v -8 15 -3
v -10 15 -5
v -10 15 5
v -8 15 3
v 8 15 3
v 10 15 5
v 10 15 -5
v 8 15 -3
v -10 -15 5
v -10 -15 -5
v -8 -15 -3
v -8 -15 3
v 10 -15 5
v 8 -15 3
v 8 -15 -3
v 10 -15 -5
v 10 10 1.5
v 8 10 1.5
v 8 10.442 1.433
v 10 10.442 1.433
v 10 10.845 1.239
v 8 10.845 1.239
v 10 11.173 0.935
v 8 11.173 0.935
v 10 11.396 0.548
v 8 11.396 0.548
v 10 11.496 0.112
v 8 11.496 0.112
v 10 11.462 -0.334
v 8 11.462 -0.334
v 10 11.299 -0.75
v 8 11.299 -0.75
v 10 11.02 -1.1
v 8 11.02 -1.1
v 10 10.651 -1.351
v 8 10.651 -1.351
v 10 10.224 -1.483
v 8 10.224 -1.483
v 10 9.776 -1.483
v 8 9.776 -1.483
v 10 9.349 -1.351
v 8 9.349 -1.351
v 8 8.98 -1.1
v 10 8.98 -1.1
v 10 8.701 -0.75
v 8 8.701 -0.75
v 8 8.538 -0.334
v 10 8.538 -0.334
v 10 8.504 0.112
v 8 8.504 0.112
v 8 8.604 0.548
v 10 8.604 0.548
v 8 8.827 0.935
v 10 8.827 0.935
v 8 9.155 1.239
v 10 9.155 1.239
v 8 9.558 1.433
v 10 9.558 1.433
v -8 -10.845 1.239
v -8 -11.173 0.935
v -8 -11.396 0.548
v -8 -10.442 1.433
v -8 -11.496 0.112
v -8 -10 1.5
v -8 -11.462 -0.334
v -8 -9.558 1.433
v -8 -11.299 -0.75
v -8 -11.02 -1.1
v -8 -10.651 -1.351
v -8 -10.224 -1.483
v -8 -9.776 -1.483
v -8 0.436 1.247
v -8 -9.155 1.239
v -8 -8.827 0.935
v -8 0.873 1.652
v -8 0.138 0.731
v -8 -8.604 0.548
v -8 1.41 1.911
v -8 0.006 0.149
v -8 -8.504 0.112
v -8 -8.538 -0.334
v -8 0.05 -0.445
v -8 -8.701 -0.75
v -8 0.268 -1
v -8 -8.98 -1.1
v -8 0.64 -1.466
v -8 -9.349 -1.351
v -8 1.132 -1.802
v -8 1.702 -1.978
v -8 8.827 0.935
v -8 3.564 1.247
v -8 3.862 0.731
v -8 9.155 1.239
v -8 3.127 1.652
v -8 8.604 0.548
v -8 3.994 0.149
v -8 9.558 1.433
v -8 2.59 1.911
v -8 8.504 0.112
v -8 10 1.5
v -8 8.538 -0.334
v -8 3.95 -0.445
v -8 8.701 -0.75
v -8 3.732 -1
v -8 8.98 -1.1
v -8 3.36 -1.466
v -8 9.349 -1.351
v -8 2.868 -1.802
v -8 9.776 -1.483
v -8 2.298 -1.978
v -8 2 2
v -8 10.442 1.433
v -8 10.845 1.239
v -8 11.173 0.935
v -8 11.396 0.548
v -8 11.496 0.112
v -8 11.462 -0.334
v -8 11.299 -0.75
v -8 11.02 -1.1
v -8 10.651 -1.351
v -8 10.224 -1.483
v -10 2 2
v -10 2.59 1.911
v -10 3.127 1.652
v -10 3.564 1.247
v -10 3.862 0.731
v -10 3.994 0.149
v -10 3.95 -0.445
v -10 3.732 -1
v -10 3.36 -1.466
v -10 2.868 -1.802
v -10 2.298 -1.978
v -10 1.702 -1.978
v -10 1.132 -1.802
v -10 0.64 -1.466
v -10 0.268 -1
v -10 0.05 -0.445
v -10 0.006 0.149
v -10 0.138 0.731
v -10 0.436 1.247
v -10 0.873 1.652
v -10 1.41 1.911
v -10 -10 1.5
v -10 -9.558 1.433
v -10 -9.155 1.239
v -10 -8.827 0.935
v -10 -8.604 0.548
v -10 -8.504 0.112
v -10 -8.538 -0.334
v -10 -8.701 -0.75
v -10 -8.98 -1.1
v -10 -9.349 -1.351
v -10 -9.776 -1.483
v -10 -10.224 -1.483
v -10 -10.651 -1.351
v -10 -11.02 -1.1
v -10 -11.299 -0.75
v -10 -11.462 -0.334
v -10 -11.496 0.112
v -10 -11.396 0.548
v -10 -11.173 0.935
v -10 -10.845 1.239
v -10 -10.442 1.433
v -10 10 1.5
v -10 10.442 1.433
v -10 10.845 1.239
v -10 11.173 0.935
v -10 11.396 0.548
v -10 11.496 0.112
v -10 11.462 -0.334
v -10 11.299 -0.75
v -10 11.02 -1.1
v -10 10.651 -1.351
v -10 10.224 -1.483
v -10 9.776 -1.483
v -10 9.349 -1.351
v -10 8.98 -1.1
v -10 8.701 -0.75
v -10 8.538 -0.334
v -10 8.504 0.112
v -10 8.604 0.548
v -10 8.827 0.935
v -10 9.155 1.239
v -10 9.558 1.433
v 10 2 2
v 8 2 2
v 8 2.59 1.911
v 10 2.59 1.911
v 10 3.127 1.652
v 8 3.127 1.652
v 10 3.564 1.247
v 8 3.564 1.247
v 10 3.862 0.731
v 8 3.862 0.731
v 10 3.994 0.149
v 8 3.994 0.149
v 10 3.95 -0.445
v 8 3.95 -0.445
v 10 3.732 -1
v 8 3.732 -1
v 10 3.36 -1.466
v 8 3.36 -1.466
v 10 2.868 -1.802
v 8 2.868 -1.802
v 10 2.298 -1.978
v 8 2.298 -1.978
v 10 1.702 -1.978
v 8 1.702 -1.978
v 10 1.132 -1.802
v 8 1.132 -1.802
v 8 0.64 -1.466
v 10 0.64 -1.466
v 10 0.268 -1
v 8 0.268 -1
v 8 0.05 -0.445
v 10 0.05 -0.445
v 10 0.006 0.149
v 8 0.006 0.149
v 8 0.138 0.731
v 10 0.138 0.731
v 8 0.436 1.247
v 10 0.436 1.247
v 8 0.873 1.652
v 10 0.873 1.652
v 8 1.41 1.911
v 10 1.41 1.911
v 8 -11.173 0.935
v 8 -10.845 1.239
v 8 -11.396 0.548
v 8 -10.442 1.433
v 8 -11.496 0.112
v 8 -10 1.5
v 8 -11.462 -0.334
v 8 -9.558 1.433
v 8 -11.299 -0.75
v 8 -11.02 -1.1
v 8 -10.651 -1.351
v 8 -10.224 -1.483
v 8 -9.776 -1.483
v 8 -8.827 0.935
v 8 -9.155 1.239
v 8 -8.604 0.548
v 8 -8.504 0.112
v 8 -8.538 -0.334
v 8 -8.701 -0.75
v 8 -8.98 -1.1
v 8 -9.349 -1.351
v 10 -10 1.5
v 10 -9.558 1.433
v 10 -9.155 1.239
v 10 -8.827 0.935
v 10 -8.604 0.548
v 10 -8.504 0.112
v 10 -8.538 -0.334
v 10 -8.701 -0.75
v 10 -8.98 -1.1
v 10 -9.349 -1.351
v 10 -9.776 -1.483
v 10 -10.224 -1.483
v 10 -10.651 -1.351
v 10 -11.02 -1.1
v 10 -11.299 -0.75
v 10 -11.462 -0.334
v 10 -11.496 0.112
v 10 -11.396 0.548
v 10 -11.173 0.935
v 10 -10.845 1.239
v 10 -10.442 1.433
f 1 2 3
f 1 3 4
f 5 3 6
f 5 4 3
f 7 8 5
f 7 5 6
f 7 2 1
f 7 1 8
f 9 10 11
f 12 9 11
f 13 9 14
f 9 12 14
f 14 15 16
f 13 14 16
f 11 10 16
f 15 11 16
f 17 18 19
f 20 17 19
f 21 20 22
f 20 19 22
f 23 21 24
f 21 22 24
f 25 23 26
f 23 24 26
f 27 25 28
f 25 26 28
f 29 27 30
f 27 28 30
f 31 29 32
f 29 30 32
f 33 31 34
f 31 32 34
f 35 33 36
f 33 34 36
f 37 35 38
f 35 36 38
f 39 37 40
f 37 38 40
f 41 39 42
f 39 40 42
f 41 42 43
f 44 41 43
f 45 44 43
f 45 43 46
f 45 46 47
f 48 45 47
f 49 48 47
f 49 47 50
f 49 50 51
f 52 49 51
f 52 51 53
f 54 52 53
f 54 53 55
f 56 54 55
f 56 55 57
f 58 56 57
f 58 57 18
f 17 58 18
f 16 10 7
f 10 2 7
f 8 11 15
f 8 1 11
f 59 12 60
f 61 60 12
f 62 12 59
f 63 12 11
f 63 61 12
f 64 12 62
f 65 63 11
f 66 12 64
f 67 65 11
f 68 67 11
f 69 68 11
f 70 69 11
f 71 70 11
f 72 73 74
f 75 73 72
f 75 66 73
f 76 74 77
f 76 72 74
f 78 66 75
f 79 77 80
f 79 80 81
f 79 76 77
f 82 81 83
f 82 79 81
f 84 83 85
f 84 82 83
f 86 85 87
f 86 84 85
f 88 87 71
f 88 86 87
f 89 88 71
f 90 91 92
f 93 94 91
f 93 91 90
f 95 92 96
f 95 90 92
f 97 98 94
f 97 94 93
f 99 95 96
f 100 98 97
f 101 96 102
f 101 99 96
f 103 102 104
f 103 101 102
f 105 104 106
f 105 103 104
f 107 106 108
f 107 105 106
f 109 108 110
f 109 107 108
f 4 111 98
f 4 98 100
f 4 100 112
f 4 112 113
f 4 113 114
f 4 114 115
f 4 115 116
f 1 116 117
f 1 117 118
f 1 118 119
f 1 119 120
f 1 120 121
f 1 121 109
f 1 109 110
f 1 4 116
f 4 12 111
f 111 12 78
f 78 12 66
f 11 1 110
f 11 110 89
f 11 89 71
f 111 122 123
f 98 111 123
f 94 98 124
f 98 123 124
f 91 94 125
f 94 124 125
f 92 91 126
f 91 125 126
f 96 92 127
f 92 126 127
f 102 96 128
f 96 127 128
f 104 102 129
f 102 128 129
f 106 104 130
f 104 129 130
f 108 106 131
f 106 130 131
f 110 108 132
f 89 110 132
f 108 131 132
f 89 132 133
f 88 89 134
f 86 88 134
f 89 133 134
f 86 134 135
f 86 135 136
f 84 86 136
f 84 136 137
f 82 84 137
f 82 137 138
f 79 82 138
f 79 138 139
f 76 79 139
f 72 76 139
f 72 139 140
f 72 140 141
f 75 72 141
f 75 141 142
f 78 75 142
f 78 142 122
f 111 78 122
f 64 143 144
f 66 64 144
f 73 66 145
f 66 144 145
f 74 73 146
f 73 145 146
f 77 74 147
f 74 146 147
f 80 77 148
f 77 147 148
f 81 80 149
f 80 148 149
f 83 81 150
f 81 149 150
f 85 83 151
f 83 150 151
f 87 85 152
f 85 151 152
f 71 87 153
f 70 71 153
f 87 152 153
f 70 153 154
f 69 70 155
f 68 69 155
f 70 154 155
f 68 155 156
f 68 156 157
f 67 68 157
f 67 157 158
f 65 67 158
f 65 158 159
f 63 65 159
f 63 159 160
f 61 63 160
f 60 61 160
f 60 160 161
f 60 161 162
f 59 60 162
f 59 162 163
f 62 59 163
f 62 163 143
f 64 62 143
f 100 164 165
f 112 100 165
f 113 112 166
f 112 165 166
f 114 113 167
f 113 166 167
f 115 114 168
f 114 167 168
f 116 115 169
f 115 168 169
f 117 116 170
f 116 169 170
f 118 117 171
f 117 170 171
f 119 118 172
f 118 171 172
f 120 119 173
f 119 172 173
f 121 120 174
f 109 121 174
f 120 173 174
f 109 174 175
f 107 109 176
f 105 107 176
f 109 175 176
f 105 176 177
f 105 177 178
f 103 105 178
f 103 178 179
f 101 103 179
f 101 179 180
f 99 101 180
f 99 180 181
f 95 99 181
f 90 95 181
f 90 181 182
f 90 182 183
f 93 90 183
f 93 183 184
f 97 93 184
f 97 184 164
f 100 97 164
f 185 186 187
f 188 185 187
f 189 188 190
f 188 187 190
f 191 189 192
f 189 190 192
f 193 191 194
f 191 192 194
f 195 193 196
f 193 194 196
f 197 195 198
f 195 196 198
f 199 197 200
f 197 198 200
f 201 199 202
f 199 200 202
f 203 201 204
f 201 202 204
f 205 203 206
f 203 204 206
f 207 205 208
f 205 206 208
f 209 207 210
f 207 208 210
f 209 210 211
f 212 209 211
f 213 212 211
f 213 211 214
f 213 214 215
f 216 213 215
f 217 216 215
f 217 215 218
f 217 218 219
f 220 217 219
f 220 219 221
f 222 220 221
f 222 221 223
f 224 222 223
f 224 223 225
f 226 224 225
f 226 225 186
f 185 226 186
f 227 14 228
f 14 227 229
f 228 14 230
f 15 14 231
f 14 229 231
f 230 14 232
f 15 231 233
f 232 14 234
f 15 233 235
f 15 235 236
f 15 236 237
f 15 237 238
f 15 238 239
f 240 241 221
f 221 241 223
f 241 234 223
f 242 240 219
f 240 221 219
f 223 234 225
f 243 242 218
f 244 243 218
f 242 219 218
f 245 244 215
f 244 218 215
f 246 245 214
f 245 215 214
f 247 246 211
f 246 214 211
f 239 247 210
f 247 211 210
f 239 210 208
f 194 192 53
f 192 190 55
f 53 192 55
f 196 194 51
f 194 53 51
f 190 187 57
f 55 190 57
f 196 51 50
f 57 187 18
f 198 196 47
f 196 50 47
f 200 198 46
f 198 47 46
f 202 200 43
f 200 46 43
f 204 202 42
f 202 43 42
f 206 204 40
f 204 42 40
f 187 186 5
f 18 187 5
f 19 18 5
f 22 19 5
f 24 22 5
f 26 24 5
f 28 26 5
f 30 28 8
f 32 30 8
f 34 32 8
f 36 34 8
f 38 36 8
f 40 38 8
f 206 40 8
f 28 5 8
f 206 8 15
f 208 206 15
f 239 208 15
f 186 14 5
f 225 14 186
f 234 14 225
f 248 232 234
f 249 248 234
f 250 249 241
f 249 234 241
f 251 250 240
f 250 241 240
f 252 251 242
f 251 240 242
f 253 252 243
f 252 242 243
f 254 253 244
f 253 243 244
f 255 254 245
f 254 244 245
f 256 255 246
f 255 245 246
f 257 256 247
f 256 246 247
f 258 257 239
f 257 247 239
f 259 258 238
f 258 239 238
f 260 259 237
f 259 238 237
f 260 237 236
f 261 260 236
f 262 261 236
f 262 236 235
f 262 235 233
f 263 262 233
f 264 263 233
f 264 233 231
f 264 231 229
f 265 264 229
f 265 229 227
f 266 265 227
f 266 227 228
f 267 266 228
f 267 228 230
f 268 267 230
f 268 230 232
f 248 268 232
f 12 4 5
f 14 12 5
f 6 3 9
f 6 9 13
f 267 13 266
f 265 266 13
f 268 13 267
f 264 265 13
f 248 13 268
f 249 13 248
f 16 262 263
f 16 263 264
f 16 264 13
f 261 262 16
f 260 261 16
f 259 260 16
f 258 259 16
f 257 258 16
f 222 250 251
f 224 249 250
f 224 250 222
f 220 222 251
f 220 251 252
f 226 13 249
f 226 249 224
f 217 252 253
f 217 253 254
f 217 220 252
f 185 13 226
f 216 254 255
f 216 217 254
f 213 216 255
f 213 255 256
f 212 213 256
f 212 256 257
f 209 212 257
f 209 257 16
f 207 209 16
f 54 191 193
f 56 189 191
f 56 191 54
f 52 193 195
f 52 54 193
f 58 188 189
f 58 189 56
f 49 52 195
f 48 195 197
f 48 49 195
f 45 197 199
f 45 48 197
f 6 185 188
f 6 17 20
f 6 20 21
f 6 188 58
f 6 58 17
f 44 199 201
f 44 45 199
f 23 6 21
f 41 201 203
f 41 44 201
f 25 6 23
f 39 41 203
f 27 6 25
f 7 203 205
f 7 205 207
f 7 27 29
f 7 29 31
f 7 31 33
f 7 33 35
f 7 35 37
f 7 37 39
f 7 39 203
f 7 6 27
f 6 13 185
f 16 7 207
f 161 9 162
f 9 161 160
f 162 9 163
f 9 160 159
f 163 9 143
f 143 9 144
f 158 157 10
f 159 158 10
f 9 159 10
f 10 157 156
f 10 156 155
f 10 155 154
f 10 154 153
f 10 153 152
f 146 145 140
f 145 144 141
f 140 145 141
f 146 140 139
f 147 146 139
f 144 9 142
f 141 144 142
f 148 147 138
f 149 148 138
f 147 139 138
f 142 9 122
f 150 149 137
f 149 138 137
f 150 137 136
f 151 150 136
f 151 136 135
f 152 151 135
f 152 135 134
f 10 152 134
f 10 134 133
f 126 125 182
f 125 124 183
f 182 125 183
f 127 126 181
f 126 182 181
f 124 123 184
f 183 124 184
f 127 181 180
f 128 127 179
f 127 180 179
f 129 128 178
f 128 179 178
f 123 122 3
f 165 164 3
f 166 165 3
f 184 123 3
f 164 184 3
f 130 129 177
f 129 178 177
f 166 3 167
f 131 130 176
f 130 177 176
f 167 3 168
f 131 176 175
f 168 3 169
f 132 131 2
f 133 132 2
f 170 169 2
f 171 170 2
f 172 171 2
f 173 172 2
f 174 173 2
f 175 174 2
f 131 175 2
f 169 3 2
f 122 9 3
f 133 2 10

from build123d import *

# Parameters (mm, degrees)
SKETCH_1_W          = 20
SKETCH_1_H          = 10
SKETCH_1_W_2        = 16
SKETCH_1_H_2        = 6
EXTRUDE_1_DEPTH     = 15
SKETCH_2_R          = 2
SKETCH_2_R_2        = 1.5
CUT_EXTRUDE_1_DEPTH = 26.495097568


with BuildPart() as part:
    # 草图1 → 凸台-拉伸1 (new, symmetric)
    with BuildSketch(Plane(origin=(0, 0, 0), x_dir=(1, 0, 0), z_dir=(0, 1, 0))):
        Rectangle(SKETCH_1_W, SKETCH_1_H)
        Rectangle(SKETCH_1_W_2, SKETCH_1_H_2, mode=Mode.SUBTRACT)
    extrude(amount=EXTRUDE_1_DEPTH, both=True)

    # 草图2 → 切除-拉伸1 (cut, through all)
    with BuildSketch(Plane.ZY.offset(10)):
        with Locations((0, 2)):
            Circle(SKETCH_2_R)
        with Locations((0, 10)):
            Circle(SKETCH_2_R_2)
        with Locations((0, -10)):
            Circle(SKETCH_2_R_2)
    extrude(amount=-CUT_EXTRUDE_1_DEPTH, mode=Mode.SUBTRACT)


solid = part.part
